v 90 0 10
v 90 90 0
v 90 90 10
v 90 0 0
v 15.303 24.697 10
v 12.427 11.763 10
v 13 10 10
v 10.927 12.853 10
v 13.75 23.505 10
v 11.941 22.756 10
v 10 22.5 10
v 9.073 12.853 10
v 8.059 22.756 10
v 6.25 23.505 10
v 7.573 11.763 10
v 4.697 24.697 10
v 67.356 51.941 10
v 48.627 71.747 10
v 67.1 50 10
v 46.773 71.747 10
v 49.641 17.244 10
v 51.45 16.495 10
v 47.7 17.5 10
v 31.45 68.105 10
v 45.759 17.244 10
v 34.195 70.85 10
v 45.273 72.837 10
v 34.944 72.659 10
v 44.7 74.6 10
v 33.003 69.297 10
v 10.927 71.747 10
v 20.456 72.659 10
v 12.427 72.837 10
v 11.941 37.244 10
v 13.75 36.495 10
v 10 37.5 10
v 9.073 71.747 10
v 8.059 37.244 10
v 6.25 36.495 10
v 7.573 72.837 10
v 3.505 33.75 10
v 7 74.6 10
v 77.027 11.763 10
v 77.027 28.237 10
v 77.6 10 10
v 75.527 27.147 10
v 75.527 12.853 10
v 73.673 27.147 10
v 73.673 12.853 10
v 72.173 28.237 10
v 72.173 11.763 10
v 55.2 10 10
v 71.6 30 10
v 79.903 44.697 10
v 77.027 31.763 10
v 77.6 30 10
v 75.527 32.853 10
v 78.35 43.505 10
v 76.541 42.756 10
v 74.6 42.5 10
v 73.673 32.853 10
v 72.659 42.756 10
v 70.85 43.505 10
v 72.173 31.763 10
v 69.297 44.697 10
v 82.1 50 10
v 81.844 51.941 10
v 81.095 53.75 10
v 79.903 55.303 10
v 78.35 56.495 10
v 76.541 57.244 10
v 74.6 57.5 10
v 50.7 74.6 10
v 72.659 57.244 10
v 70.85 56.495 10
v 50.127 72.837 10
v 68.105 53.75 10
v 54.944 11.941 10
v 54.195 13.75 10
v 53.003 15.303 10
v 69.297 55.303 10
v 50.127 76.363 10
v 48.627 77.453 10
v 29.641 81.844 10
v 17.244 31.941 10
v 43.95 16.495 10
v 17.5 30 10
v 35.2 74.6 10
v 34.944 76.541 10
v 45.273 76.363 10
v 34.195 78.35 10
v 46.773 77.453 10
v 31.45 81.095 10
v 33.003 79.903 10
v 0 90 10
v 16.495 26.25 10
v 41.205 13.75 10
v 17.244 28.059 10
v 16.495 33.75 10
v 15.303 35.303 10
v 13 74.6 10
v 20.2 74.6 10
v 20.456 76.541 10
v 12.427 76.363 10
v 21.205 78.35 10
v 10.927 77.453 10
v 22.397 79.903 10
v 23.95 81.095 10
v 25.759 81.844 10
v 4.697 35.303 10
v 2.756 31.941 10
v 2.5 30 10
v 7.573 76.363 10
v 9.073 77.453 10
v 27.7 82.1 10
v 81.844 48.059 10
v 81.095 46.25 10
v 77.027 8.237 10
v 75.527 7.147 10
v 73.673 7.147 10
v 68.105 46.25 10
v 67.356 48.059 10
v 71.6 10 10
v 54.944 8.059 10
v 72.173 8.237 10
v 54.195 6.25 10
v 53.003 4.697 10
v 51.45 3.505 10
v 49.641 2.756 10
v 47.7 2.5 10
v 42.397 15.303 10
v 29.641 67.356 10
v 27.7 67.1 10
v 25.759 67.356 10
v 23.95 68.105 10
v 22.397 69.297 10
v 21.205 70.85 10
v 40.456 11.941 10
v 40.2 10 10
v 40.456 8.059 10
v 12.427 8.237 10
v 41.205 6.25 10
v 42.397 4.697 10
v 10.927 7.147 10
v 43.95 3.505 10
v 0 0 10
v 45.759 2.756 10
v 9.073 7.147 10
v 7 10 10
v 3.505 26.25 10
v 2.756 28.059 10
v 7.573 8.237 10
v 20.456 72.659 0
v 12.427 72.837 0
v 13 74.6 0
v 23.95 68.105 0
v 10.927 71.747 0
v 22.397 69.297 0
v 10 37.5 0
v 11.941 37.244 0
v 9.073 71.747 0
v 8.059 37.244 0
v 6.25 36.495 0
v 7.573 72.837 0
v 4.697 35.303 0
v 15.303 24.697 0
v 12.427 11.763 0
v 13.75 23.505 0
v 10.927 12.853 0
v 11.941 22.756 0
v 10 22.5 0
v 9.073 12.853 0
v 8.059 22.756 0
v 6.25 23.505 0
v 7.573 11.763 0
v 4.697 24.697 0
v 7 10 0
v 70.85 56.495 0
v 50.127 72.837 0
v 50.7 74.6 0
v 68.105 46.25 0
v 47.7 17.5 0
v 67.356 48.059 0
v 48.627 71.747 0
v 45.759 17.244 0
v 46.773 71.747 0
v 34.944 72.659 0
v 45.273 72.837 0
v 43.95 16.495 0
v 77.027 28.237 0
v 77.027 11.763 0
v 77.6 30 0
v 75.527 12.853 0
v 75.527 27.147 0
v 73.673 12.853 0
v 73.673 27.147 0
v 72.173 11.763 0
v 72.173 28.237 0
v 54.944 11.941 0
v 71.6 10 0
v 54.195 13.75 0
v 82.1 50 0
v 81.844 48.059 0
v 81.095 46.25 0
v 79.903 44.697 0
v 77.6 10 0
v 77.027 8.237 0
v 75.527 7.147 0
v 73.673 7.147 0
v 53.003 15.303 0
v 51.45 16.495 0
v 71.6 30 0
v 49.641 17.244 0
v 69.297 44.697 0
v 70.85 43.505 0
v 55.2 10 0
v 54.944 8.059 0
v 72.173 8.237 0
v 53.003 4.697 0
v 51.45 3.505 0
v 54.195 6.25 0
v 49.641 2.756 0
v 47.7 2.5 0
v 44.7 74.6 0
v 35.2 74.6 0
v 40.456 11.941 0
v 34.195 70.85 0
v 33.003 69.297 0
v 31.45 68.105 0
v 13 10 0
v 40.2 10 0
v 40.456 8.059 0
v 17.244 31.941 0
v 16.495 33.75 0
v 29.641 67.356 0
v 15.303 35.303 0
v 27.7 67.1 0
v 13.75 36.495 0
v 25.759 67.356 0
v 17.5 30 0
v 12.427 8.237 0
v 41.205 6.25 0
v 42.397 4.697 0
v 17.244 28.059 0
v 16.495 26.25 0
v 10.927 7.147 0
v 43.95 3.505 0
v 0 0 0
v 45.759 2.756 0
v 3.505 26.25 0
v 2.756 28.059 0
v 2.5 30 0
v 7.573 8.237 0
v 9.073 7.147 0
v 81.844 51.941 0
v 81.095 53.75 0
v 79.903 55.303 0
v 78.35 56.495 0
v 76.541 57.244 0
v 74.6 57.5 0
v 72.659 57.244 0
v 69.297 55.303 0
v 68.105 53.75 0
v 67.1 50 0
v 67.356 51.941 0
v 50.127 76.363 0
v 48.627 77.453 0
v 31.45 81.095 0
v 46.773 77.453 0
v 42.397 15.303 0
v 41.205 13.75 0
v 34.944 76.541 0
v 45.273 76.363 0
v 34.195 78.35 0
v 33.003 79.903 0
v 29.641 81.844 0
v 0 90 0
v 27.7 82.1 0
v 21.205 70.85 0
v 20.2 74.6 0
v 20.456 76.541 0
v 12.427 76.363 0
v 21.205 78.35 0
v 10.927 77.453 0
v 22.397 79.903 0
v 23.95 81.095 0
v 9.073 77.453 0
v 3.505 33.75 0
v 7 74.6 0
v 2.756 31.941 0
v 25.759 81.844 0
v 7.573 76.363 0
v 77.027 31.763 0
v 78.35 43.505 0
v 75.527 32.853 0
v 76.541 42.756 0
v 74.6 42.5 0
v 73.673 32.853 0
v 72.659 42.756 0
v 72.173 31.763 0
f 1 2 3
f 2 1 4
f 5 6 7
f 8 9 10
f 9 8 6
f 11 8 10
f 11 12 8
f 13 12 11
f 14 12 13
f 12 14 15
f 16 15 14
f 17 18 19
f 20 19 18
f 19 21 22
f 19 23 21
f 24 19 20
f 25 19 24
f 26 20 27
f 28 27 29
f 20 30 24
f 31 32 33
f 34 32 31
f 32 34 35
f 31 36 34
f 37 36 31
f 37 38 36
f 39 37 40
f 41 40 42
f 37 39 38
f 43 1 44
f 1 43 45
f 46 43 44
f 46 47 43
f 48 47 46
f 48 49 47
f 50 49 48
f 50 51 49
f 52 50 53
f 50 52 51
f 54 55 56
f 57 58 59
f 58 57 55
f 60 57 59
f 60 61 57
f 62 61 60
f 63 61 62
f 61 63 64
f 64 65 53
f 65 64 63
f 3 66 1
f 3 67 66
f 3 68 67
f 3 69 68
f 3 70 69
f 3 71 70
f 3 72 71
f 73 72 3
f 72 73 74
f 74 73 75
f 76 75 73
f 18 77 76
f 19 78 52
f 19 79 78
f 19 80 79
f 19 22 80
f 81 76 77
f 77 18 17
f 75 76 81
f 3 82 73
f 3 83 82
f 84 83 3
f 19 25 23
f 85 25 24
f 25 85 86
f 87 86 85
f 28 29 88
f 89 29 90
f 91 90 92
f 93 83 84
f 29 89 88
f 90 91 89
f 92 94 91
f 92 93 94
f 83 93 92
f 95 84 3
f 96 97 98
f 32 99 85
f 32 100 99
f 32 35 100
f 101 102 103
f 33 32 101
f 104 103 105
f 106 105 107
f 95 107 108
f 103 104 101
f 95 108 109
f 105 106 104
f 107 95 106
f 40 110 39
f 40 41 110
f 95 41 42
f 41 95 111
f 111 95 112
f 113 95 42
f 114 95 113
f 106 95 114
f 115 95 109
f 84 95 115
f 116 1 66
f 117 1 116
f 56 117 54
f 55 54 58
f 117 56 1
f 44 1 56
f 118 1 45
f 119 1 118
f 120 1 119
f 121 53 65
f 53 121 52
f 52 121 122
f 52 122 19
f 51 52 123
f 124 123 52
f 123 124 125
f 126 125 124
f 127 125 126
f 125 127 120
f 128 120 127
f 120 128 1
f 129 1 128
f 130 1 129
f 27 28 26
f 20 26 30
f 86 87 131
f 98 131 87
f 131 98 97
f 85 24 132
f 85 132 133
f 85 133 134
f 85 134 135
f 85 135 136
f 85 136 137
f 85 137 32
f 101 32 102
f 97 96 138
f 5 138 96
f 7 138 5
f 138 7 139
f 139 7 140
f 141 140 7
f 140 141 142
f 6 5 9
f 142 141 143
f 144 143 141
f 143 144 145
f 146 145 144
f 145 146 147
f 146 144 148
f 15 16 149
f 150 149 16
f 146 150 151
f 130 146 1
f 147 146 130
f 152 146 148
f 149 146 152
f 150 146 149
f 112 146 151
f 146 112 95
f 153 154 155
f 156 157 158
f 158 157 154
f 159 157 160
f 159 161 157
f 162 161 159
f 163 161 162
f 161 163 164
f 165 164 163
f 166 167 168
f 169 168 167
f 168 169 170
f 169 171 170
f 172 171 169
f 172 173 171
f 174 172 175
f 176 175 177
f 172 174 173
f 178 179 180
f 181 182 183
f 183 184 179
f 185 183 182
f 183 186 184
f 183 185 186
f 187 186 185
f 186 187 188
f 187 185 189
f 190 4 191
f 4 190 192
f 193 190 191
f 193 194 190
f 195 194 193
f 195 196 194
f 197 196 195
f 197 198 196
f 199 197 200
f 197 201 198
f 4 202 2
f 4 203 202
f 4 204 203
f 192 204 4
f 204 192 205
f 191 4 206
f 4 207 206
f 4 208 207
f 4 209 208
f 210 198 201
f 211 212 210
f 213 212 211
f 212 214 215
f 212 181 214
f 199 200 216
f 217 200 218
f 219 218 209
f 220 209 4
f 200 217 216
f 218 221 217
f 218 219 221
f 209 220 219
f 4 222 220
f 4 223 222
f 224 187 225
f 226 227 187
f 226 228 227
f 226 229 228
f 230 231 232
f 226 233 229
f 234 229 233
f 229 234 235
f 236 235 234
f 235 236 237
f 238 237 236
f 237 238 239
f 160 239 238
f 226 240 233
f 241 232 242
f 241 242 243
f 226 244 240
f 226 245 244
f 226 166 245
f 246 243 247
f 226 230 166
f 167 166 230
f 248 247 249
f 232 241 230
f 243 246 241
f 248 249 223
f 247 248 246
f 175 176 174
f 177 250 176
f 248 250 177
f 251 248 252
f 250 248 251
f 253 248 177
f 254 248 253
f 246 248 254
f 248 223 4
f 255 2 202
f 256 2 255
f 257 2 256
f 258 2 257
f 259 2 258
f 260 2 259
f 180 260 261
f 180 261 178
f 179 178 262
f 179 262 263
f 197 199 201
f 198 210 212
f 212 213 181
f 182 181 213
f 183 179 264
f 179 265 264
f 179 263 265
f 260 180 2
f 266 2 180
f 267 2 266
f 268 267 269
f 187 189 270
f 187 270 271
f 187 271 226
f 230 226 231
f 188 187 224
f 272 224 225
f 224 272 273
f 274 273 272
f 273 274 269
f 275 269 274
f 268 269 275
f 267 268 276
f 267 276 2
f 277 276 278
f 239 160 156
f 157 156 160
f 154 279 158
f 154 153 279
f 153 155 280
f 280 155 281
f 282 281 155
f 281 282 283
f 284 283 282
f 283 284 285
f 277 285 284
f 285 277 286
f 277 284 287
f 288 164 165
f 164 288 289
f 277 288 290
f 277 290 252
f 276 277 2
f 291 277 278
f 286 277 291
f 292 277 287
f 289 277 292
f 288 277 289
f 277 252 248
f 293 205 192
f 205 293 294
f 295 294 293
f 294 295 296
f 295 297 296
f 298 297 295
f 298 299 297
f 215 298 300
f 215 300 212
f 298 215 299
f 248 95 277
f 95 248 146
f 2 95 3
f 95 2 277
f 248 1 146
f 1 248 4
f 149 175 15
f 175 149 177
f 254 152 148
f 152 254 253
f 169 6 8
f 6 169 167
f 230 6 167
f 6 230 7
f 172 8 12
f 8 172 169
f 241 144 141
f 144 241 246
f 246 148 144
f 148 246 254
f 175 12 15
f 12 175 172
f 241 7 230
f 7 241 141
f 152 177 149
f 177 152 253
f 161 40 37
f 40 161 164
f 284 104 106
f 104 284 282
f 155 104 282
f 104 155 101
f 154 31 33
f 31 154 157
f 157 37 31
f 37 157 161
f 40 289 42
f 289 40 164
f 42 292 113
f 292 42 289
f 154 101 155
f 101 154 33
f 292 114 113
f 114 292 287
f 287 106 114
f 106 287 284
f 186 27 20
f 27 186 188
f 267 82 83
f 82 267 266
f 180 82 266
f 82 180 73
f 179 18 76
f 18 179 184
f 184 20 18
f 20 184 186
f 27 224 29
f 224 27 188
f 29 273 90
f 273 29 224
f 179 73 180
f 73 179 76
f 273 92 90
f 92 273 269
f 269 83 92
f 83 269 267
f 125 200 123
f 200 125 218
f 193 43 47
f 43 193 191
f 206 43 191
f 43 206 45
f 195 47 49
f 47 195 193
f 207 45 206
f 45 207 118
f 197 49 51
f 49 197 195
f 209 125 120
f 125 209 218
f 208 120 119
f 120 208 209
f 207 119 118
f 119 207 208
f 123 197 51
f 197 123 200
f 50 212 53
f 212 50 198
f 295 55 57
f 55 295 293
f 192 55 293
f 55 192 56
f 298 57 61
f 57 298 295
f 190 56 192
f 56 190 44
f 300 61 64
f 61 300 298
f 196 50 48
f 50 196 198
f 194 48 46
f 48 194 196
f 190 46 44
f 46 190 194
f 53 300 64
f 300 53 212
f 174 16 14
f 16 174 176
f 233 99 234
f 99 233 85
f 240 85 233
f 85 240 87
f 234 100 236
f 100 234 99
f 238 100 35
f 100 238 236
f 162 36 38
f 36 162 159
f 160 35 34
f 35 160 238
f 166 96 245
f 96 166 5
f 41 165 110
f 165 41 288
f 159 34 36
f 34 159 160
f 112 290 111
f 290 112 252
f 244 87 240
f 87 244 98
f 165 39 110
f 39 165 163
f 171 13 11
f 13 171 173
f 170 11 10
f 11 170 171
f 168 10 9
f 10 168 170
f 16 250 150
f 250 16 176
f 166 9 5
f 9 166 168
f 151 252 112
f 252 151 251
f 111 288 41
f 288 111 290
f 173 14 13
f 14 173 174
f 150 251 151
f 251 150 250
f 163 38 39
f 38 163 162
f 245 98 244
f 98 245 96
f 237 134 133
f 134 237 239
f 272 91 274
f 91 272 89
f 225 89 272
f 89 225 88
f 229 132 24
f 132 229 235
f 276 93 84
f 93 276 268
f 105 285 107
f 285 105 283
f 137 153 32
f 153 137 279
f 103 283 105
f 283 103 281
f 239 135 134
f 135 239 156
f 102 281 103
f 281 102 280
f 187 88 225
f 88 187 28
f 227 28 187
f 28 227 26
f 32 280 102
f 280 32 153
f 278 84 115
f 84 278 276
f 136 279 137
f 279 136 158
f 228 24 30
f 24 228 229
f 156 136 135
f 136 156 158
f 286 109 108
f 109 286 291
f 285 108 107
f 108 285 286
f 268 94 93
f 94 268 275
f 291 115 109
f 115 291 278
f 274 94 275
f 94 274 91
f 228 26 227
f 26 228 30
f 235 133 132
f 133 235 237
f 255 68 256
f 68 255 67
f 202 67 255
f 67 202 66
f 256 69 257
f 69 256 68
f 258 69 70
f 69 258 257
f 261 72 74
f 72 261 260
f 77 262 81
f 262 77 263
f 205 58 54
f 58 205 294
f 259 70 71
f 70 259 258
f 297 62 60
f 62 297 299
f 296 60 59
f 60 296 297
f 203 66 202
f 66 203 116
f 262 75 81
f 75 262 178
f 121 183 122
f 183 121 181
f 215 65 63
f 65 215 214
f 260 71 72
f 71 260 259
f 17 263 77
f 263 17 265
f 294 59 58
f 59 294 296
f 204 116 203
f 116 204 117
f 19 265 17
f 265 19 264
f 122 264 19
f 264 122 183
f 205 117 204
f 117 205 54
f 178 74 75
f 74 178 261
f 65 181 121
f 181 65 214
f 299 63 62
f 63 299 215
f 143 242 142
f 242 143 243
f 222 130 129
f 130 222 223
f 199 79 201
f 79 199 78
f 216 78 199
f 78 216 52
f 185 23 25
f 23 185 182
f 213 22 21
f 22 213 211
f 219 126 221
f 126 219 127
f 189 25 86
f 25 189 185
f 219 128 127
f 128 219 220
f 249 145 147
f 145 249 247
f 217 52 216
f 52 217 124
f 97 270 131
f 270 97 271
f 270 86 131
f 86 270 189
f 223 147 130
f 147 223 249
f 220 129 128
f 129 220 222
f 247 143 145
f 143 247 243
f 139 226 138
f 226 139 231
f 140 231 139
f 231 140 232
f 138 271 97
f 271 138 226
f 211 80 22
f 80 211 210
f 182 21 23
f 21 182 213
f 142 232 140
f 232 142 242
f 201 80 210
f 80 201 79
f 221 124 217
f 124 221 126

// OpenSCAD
height = 10;
width = 90;
rad=3;

difference(){
	cube(size = [width,width,10], center =false);


	// Screw holes

		// Common Hole
		translate(v=[10,10,0])
		cylinder(h=height, r=rad, center=false);


		// Y-axis holes
		translate(v=[10,74.6,0])
		cylinder(h=height, r=rad, center=false);

		translate(v=[47.7,74.6,0])
		cylinder(h=height, r=rad, center=false);


		// Z-axis holes
		translate(v=[74.6,10,0])
		cylinder(h=height, r=rad, center=false);

		translate(v=[74.6,30,0])
		cylinder(h=height, r=rad, center=false);


	
	// Cutouts

		translate(v=[10,30,0])
		cylinder(h=height, r=2.5*rad, center=false);

		translate(v=[27.7,74.6,0])
		cylinder(h=height, r=2.5*rad, center=false);

		translate(v=[74.6,50,0])
		cylinder(h=height, r=2.5*rad, center=false);

		translate(v=[47.7,10,0])
		cylinder(h=height, r=2.5*rad, center=false);
}
